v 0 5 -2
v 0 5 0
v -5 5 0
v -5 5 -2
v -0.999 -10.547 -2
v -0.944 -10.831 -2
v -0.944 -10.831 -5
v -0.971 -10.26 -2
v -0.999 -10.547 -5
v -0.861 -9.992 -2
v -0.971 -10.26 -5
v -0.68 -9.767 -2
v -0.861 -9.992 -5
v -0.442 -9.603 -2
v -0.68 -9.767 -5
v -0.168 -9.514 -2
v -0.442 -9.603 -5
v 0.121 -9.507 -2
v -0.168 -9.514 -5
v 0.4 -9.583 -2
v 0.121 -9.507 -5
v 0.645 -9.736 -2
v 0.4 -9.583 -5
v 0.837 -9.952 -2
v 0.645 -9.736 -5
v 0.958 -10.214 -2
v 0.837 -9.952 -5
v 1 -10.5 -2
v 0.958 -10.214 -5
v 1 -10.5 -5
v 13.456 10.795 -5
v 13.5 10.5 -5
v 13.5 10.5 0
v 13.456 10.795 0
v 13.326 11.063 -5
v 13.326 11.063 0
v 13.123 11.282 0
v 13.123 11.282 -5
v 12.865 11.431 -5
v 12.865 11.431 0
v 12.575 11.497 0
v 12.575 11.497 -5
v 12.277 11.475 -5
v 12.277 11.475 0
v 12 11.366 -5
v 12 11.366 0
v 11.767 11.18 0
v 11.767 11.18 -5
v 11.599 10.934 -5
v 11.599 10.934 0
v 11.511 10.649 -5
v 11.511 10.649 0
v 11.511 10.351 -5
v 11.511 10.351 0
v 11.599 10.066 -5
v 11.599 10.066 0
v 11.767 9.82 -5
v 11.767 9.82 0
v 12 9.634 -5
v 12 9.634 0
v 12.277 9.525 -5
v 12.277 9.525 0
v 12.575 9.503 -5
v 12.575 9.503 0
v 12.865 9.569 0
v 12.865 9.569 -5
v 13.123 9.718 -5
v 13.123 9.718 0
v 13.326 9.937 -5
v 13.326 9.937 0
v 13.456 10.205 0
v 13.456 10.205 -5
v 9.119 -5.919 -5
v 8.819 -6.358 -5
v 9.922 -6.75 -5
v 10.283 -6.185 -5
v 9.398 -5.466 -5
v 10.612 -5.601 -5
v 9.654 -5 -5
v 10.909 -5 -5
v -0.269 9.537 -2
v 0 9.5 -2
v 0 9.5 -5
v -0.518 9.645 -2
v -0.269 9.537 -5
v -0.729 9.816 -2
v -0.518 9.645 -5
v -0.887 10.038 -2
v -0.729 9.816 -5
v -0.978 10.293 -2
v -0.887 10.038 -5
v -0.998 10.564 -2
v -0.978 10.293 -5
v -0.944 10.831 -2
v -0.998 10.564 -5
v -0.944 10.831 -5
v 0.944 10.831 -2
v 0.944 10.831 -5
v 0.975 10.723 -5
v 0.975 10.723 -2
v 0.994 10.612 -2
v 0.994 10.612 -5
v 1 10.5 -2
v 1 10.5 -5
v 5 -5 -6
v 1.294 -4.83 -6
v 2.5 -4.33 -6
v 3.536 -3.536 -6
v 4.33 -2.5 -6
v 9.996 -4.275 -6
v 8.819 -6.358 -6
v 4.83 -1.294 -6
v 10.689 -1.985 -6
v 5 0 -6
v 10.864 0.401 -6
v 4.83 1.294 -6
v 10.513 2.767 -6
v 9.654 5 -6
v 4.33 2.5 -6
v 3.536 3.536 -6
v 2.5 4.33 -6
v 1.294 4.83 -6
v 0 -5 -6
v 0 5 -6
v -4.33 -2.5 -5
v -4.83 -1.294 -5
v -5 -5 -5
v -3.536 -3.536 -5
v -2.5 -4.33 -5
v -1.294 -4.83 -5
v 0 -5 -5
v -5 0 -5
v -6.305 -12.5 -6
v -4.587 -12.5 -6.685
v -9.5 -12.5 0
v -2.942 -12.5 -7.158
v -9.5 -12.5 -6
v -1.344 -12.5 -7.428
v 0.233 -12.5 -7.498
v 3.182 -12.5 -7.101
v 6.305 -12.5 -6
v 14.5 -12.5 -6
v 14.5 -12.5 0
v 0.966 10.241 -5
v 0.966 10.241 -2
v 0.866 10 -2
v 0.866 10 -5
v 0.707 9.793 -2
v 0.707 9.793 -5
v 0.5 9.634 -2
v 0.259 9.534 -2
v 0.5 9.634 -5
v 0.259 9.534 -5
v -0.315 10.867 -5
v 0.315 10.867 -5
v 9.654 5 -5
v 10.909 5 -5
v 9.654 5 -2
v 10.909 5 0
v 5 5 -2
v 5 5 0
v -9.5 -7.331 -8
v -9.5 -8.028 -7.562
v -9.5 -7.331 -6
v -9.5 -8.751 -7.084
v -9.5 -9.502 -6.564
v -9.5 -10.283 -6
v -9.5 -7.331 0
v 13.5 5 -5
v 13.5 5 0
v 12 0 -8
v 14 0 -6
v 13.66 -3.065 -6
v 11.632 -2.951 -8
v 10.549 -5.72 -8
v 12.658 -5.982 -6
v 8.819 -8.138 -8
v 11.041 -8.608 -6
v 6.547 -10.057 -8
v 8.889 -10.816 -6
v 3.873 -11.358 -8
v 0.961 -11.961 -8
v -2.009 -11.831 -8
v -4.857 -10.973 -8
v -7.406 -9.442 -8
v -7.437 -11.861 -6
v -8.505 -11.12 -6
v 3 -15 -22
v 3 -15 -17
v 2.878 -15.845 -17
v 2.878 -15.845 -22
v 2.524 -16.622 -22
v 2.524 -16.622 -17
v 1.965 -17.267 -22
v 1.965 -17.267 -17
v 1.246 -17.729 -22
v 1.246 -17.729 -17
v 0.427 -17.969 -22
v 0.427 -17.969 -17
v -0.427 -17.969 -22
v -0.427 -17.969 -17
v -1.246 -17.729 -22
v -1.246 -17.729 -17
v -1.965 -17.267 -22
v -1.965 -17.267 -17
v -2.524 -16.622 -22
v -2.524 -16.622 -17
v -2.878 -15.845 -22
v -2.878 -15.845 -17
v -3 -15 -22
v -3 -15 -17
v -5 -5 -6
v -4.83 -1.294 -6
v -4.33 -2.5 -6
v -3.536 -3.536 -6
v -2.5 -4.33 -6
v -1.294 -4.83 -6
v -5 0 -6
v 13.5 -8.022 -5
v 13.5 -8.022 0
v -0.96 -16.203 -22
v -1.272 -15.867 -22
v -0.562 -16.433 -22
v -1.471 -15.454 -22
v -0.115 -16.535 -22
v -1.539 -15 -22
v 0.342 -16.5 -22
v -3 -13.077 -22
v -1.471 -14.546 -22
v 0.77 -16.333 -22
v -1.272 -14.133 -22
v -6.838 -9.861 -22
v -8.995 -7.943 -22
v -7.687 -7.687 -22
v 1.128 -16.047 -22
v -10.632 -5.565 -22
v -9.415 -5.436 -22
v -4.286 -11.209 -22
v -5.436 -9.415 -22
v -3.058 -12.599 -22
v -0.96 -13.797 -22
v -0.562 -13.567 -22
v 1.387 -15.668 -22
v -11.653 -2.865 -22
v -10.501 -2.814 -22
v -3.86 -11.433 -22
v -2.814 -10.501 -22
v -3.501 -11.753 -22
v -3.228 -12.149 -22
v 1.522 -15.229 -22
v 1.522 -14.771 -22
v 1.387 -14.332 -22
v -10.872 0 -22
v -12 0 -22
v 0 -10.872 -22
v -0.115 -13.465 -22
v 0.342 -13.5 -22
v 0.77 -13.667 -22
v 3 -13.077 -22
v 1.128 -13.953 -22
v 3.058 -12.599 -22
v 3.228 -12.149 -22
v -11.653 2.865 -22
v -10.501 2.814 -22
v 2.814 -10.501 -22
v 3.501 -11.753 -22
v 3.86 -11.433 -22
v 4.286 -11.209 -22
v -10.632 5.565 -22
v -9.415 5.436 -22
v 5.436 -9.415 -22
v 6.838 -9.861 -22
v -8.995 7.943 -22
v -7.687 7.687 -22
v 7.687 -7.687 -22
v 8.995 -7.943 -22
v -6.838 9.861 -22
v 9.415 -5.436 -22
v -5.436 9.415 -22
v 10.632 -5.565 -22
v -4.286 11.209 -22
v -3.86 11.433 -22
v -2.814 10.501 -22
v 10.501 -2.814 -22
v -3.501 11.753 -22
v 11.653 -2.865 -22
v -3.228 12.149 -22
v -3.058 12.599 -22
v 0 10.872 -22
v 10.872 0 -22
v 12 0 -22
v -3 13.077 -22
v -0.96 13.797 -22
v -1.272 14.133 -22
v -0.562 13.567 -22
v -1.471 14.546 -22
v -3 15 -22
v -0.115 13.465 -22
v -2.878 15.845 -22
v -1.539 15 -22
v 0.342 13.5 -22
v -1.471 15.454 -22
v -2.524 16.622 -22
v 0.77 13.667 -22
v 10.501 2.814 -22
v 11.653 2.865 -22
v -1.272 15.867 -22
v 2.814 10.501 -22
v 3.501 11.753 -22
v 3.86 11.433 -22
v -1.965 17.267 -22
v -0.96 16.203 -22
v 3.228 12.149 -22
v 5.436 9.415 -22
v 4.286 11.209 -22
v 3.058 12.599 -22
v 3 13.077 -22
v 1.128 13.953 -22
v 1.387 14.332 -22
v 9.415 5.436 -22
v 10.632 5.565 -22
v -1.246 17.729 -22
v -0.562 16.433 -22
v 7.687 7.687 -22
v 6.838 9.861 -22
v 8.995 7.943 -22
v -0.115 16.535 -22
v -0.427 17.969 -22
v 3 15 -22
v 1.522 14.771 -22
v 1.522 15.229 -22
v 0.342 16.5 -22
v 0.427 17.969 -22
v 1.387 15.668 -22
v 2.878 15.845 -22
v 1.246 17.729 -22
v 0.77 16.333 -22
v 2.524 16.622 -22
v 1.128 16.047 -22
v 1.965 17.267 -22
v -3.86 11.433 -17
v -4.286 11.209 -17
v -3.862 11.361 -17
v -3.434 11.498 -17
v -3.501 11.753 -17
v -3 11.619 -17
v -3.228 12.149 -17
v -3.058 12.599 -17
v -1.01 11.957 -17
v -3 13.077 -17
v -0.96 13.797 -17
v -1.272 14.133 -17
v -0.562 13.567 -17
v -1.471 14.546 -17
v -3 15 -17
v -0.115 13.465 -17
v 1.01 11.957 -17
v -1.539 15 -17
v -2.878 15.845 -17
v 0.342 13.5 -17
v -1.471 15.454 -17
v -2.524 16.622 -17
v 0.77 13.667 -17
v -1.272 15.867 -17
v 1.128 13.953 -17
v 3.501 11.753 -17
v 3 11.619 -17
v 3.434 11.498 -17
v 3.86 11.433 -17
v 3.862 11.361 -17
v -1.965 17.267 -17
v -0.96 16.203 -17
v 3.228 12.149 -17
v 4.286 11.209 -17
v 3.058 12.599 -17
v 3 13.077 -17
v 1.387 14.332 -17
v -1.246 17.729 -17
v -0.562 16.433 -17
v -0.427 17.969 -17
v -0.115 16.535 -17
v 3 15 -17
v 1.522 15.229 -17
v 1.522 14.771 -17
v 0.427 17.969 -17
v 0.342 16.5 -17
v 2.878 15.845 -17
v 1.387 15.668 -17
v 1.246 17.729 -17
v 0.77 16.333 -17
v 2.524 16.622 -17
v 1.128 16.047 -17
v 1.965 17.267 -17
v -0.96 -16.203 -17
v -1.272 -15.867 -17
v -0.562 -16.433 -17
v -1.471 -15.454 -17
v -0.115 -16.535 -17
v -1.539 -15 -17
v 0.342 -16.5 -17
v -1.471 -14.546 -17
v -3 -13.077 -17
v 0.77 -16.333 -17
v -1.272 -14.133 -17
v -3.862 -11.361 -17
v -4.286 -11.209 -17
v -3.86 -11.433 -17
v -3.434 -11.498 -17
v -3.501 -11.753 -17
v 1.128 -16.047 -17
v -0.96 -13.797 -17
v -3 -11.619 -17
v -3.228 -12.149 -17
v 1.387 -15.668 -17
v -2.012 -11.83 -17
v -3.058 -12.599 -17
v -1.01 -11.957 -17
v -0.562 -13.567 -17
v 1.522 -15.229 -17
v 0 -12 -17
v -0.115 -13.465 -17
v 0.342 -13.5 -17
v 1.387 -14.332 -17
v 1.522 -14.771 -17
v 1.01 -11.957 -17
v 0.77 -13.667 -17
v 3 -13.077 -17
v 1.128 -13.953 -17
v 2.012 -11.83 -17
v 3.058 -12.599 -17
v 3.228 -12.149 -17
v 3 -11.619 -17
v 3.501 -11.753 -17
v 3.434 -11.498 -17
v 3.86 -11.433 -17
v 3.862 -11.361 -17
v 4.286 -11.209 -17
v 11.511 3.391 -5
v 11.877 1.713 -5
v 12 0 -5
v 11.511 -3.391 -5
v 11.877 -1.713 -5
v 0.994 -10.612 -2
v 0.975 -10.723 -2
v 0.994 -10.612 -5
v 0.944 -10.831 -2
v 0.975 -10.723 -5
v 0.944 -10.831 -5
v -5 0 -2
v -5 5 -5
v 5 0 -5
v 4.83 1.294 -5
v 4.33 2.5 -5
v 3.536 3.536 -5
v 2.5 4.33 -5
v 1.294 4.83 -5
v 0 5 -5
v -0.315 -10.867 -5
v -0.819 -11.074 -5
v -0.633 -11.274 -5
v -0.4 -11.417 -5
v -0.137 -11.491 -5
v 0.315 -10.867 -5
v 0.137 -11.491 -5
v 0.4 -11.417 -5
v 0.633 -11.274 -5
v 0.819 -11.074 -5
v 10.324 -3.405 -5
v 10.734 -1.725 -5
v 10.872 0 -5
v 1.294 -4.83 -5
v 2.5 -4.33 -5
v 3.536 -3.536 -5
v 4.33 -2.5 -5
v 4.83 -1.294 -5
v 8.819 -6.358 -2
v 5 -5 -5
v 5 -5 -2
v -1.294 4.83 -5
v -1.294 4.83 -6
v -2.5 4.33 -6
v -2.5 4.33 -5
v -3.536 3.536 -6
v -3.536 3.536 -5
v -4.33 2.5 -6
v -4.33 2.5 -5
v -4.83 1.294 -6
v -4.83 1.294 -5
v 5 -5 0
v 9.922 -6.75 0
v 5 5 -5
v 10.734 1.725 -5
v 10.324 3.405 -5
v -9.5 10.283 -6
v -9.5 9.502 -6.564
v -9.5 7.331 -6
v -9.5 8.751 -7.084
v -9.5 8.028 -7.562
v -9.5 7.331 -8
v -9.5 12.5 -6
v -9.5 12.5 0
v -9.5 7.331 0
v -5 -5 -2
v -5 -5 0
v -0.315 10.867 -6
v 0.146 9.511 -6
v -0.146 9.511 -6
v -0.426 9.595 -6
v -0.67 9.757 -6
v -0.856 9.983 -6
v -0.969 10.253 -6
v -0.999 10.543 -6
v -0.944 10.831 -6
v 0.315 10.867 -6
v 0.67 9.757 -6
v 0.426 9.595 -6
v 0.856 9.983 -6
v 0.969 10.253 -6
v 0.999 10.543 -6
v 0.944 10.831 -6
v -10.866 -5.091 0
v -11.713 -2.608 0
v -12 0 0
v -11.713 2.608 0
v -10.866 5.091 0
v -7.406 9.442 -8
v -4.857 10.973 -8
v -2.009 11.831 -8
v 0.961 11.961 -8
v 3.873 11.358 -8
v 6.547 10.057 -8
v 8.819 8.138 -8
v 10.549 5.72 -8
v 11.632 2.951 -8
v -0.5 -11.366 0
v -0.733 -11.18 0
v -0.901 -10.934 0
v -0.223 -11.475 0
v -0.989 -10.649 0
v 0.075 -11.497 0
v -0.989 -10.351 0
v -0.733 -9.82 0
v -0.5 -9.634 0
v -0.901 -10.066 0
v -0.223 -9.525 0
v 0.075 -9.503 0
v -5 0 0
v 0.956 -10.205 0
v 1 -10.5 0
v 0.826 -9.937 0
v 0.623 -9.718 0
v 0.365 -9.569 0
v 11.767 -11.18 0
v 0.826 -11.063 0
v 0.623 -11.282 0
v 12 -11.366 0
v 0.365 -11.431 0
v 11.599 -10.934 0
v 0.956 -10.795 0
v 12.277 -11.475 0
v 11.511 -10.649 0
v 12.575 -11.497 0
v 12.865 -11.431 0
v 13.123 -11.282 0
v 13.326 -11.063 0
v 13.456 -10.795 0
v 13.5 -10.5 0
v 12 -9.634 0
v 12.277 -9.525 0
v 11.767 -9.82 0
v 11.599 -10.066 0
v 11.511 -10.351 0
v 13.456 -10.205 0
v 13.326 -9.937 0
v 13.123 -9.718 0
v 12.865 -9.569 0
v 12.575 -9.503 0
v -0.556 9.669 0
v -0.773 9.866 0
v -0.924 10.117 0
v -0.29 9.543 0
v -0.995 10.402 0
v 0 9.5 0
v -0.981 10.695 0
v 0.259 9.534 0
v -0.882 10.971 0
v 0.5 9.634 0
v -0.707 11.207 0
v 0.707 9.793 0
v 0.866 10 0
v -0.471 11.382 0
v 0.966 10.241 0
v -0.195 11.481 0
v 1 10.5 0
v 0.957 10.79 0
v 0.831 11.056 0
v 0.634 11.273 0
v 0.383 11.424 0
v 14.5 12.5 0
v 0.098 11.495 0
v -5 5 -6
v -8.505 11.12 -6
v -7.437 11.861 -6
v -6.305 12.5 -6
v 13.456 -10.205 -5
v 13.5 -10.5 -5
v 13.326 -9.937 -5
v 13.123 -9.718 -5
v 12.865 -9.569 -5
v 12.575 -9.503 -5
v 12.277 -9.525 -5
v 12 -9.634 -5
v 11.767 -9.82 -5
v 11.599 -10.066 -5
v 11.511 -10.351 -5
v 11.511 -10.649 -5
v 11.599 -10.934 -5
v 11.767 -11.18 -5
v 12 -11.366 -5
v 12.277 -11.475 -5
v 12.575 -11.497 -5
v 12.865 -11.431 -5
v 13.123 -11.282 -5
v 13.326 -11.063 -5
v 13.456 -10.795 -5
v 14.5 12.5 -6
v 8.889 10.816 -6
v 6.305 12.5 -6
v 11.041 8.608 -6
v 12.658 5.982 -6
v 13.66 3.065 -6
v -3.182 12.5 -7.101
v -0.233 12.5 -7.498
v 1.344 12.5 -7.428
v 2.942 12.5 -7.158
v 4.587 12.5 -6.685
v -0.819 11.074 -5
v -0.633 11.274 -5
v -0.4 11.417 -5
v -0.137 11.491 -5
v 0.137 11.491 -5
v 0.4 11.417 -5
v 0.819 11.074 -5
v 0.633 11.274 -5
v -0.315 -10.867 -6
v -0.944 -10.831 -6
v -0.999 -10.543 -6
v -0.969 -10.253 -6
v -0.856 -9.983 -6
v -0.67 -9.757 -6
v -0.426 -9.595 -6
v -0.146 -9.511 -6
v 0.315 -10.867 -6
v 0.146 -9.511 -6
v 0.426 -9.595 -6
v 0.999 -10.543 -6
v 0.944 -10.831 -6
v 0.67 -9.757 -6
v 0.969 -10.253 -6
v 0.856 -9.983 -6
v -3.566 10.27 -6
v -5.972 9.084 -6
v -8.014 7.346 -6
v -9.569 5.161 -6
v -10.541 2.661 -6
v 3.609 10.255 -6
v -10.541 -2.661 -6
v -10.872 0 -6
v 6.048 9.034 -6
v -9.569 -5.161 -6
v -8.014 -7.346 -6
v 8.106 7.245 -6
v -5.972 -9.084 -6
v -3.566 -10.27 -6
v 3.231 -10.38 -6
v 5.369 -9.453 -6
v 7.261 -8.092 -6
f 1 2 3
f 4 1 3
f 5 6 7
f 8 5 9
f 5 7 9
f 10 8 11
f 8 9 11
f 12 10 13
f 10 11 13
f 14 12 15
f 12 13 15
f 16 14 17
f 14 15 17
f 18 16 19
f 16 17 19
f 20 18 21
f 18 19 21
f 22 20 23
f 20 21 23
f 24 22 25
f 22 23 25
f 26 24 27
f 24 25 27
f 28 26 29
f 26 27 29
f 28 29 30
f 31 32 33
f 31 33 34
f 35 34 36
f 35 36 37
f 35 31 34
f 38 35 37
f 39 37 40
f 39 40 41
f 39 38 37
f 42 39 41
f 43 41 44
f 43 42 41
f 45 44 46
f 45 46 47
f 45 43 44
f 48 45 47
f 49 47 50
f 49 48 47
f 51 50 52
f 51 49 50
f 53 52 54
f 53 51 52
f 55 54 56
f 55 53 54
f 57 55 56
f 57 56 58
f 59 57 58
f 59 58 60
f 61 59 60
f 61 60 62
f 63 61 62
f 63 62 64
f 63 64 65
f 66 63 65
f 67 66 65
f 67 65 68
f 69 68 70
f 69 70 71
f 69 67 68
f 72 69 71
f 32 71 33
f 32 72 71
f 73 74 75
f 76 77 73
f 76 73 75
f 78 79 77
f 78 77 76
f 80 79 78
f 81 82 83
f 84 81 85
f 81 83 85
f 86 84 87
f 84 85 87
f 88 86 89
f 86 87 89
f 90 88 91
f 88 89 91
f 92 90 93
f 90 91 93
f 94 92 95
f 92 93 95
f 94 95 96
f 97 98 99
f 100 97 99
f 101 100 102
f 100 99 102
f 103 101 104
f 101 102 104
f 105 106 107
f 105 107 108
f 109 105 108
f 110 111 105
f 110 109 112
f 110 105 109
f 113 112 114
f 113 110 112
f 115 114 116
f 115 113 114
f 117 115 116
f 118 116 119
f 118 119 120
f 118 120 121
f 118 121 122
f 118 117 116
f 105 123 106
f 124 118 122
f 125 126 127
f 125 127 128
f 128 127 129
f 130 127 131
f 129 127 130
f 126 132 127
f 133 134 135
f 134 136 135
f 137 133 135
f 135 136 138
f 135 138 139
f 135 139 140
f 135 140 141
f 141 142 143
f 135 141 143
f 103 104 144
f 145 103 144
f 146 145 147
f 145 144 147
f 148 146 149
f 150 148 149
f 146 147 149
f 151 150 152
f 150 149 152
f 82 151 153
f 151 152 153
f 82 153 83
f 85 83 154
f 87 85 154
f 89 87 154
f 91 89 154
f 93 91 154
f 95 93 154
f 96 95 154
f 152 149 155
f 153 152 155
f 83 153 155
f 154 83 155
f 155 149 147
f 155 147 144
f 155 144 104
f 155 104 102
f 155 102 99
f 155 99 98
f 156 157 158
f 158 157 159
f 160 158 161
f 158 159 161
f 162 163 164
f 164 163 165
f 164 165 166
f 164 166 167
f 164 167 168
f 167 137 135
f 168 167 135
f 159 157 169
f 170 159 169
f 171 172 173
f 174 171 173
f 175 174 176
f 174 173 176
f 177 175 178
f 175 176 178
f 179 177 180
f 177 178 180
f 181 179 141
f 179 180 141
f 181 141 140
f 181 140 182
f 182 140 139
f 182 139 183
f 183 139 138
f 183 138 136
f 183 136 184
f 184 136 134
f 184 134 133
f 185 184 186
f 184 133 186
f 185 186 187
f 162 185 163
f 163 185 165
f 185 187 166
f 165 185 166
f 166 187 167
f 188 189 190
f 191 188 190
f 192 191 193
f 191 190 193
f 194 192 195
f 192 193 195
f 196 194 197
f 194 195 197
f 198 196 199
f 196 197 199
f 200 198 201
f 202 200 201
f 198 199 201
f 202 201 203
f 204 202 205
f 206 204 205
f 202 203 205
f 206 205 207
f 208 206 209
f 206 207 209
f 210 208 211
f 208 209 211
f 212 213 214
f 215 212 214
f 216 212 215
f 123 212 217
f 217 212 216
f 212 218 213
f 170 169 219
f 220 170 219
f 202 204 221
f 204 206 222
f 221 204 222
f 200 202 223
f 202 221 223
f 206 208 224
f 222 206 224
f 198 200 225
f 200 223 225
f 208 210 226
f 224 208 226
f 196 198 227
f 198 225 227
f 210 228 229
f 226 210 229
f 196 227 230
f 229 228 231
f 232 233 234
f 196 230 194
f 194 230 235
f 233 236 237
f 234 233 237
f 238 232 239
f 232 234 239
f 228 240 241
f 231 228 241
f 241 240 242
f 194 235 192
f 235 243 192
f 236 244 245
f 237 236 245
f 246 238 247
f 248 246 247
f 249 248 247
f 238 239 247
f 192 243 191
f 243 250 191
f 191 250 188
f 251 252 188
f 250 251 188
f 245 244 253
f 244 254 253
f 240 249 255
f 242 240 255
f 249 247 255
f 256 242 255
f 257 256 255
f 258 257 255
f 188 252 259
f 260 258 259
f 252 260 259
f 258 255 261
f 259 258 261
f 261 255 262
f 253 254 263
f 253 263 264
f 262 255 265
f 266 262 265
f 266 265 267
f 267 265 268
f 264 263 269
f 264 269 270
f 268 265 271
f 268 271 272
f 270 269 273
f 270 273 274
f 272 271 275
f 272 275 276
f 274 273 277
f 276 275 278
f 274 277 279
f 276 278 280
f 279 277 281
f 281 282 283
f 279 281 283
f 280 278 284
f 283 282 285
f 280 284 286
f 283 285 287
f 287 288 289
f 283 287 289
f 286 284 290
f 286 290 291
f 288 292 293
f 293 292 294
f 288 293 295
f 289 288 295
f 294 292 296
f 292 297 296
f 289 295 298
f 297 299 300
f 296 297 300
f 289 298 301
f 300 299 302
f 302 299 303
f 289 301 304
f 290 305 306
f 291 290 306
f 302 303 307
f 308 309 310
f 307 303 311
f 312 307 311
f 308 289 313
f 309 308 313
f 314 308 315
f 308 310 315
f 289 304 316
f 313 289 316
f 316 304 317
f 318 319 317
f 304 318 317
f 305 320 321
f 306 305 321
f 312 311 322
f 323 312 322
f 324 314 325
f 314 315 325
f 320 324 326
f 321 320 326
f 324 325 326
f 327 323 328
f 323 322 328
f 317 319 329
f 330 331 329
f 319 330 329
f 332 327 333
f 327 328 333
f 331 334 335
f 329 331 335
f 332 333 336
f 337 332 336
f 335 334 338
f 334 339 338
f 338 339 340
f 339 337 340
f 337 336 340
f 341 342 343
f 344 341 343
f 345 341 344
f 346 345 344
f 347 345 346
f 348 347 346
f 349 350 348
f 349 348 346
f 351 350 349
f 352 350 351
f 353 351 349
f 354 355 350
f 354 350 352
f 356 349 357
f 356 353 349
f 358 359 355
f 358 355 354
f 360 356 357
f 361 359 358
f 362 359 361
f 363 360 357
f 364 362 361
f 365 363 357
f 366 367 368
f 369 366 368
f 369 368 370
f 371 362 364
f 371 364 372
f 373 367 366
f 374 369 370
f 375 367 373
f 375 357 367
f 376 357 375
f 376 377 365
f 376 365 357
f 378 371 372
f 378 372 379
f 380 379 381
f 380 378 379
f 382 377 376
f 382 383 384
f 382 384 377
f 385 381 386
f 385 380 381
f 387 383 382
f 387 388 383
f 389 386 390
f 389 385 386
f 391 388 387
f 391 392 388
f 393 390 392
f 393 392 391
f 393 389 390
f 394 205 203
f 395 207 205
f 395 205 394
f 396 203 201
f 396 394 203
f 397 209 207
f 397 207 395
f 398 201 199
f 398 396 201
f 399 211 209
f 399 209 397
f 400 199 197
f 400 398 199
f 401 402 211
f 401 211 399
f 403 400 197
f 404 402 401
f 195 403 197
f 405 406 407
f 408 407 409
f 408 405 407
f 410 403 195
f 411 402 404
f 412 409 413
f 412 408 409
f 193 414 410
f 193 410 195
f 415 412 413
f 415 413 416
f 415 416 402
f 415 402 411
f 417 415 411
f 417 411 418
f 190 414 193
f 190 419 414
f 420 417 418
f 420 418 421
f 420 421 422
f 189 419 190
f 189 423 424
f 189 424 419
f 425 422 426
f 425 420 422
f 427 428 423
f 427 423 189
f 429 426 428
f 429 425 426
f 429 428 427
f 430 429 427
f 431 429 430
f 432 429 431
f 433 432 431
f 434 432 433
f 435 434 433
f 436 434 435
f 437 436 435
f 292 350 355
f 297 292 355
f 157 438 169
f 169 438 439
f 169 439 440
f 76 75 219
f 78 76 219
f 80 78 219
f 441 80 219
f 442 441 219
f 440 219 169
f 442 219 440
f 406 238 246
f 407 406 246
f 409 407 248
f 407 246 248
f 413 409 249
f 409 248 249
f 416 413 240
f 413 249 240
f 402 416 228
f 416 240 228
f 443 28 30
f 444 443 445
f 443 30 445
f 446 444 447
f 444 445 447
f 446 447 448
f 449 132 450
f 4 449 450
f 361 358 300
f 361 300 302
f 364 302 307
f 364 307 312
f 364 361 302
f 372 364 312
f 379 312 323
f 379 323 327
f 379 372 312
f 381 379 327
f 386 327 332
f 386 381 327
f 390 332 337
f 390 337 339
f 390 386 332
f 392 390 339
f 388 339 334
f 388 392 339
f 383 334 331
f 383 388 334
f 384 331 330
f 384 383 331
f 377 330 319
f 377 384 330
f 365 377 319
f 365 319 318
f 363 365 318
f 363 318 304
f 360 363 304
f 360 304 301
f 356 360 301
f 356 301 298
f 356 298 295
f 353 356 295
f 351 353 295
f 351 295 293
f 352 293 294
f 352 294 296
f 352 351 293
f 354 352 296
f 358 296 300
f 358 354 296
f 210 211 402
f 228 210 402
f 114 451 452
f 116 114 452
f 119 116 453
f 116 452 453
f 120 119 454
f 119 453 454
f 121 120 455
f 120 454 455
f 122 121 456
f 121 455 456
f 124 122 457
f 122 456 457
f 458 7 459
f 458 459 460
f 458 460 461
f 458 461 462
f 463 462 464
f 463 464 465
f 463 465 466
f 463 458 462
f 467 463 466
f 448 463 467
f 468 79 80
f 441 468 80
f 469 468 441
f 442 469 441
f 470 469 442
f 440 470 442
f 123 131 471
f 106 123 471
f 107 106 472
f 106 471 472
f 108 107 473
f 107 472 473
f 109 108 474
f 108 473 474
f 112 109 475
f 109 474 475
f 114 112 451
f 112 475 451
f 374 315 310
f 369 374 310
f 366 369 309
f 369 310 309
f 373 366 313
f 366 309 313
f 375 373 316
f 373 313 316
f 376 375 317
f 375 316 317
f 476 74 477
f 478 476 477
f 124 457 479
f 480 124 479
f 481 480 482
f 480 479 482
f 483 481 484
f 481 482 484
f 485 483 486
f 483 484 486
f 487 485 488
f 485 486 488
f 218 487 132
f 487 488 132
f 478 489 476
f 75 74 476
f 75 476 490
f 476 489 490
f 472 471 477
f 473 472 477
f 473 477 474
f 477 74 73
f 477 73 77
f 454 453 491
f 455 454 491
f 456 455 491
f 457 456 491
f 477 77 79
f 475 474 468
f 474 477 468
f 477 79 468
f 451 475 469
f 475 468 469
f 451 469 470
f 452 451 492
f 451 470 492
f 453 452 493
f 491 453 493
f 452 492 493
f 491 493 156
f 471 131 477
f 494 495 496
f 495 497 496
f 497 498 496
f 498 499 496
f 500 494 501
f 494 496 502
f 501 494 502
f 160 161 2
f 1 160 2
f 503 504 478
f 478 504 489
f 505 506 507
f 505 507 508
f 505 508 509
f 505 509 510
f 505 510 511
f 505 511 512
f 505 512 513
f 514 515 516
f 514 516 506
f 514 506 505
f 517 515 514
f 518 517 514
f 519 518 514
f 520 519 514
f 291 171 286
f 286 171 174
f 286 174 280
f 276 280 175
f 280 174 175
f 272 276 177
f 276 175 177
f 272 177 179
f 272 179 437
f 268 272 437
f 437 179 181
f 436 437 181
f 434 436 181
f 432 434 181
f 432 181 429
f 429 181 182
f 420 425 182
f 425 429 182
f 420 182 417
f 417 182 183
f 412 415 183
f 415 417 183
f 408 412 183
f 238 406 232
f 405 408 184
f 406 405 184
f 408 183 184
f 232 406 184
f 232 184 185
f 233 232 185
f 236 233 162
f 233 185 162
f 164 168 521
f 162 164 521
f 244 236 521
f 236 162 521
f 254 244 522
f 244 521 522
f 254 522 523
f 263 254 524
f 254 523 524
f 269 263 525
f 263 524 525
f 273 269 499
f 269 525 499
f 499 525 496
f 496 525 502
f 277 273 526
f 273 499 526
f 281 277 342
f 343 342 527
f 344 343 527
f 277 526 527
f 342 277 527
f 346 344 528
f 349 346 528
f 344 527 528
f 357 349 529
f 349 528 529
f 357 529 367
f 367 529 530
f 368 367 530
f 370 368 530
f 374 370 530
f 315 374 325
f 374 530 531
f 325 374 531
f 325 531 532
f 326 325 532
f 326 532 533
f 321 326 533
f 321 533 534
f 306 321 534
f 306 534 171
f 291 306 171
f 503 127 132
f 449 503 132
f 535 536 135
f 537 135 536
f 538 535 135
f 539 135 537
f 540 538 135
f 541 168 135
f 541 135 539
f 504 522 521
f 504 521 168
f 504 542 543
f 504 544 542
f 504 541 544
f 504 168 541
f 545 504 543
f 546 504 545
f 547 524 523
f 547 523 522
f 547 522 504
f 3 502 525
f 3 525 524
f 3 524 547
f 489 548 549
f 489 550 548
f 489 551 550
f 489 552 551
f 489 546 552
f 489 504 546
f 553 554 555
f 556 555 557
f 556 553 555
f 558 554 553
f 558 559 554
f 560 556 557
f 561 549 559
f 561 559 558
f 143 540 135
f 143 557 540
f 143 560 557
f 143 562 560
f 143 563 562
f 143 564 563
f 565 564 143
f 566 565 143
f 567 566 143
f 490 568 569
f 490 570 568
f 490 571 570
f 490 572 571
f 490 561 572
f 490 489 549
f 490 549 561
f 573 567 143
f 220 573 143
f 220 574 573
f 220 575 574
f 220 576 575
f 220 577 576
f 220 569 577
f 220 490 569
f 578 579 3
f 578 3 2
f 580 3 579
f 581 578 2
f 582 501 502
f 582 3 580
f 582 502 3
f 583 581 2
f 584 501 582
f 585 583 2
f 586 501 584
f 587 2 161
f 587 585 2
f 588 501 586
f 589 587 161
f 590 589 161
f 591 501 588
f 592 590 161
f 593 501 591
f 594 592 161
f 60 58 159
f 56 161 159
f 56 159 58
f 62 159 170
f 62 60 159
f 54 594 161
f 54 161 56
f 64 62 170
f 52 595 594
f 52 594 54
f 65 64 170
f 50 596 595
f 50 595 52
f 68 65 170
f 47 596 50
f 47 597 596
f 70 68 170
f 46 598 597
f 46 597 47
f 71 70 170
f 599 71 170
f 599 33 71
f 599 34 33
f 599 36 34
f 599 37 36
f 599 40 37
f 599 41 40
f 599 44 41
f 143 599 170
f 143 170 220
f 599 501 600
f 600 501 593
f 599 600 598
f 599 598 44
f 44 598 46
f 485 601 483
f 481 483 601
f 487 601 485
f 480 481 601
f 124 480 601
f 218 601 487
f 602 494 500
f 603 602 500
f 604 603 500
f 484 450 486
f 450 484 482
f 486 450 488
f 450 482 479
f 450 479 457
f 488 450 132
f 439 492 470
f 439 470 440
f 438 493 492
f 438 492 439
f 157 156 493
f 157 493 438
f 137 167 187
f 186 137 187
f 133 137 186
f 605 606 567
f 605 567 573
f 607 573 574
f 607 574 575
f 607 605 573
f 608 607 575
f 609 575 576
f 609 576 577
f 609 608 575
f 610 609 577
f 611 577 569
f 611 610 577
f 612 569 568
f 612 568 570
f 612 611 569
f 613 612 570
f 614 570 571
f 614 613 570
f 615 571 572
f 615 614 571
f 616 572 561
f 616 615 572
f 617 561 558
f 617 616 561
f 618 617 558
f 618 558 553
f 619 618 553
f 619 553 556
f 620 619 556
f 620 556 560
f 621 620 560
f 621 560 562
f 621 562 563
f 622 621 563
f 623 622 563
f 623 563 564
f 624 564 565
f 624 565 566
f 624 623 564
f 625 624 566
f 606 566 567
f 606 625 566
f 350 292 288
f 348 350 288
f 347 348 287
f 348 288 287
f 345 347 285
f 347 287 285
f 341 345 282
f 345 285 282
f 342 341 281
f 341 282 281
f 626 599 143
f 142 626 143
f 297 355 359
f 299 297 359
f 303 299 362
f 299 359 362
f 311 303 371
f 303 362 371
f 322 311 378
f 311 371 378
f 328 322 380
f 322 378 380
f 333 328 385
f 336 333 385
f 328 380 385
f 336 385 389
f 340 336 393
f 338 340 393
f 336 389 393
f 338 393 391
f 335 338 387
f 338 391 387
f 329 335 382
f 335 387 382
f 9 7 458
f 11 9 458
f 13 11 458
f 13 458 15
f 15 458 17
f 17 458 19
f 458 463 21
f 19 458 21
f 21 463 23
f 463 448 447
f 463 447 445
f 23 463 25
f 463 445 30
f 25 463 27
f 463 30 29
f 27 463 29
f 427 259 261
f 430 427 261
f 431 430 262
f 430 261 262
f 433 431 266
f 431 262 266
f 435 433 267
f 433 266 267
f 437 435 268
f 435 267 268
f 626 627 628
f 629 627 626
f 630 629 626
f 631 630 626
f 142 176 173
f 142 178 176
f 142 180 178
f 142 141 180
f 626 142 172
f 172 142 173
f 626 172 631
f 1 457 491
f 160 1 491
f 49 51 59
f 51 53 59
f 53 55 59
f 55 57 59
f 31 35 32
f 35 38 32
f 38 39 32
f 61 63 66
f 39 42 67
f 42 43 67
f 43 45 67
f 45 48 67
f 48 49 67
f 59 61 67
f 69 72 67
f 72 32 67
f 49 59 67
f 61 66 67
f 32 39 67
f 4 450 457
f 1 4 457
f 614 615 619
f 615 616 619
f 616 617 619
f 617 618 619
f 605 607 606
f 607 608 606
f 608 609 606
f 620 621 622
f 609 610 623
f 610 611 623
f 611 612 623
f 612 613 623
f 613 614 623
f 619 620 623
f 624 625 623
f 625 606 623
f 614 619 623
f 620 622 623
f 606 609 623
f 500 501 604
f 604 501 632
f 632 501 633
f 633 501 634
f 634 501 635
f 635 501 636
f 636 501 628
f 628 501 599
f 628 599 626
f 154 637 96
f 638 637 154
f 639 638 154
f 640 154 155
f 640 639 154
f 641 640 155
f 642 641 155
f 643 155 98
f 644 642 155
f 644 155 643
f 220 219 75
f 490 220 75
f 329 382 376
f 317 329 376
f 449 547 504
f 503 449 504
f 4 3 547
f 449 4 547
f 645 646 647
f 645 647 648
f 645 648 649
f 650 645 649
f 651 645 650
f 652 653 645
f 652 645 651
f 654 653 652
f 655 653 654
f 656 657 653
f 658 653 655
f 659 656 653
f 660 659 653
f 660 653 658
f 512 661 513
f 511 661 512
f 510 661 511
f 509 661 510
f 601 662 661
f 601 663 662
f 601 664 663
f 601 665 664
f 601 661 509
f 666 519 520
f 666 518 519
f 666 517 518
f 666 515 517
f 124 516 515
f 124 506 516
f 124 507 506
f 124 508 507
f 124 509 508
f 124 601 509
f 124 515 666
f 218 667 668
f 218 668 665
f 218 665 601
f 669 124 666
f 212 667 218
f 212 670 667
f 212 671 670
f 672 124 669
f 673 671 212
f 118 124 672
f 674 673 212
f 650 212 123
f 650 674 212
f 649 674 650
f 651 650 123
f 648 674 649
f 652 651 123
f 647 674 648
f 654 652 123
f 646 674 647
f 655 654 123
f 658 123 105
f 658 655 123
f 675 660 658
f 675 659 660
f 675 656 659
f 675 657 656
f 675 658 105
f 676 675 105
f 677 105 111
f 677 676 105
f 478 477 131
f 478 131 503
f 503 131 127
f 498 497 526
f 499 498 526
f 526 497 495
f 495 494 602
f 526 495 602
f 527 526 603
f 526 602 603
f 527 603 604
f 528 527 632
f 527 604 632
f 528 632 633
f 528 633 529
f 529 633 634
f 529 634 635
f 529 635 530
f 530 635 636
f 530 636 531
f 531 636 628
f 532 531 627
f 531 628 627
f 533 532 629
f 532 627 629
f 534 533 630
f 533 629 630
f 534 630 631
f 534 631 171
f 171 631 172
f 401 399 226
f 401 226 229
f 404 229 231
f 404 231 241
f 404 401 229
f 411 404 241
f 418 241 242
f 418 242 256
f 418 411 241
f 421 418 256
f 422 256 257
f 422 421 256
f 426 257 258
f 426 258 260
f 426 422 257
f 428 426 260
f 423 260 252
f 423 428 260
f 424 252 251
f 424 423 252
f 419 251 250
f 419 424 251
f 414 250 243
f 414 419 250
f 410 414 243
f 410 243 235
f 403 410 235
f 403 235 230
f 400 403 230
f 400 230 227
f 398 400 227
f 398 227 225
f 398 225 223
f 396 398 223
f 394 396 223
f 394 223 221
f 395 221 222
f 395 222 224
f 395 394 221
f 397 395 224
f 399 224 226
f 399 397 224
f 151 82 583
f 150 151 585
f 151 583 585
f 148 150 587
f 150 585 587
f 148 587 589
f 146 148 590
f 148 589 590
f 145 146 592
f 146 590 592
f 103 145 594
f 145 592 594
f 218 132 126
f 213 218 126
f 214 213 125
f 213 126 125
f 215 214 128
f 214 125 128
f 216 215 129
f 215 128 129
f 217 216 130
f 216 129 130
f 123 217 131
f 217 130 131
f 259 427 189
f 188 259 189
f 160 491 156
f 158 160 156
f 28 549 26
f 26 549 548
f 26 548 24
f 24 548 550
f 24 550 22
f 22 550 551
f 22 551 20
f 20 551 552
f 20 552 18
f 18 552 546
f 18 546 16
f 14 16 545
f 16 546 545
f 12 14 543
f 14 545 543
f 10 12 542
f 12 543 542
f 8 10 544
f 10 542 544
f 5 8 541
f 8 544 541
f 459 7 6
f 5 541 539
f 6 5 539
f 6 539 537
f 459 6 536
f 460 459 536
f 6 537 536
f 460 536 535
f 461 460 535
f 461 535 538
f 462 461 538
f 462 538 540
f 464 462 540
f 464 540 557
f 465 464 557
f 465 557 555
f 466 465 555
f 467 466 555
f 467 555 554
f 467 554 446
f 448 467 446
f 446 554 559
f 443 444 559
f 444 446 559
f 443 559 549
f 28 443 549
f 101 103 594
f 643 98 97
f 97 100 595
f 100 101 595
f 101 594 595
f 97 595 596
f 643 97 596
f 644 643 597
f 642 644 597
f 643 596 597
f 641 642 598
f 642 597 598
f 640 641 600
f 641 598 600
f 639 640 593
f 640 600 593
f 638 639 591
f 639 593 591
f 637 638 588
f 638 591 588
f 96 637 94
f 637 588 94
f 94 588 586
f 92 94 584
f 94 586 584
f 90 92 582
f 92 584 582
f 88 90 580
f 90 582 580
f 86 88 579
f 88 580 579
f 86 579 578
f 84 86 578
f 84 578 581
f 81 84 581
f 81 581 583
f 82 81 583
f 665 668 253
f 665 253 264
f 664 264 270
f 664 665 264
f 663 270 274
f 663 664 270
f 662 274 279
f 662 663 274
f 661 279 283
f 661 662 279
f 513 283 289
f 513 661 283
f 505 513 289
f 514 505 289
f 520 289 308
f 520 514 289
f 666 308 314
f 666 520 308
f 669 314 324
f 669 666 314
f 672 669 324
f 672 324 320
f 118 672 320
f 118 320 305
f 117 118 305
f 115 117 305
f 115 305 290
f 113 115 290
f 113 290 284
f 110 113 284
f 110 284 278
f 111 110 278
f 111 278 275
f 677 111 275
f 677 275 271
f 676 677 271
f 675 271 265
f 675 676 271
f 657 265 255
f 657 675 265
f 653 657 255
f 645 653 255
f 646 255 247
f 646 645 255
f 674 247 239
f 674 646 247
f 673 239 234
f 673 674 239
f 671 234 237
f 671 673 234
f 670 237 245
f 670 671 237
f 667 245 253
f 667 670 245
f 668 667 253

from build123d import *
from build123d.topology import SkipClean

# Parameters (mm, degrees)
SKETCH1_R               = 12
SKETCH1_R_2             = 4.75
BOSS_EXTRUDE1_DEPTH     = 2
SKETCH2_R               = 12
SKETCH2_R_2             = 10.871602624
BOSS_EXTRUDE3_DEPTH     = 20
BOSS_EXTRUDE4_START     = -5
SKETCH3_R               = 1.539073807
BOSS_EXTRUDE4_DEPTH     = 5
BOSS_EXTRUDE4_2_DEPTH   = 5
BOSS_EXTRUDE5_START     = -5
BOSS_EXTRUDE5_OUTLINE_R = 1
BOSS_EXTRUDE5_DEPTH     = 5
SKETCH5_4_R             = 1
CUT_EXTRUDE4_DEPTH      = 5
SKETCH6_R               = 1
BOSS_EXTRUDE11_DEPTH    = 1
CHAMFER1_SIZE           = 2
FILLET2_START           = -22
FILLET2_DEPTH           = 5
SKETCH7_R               = 12
BOSS_EXTRUDE13_DEPTH    = 1


with BuildPart() as part:
    # Sketch1 → Boss-Extrude1 (new body)
    with BuildSketch(Plane(origin=(0, 0, 0), x_dir=(0, 1, 0), z_dir=(0, 0, 1))):
        with Locations(Location((0, 0, 0), (0, 0, 270))):
            Circle(SKETCH1_R)
        with Locations(Location((0, 0, 0), (0, 0, 270))):
            Circle(SKETCH1_R_2, mode=Mode.SUBTRACT)
    extrude(amount=-BOSS_EXTRUDE1_DEPTH)

    # Sketch2 → Boss-Extrude3 (add)
    with BuildSketch(Plane(origin=(0, 0, -2), x_dir=(1, 0, 0), z_dir=(0, 0, -1))):
        Circle(SKETCH2_R)
        with Locations(Location((0, 0, 0), (0, 0, 180))):
            Circle(SKETCH2_R_2, mode=Mode.SUBTRACT)
    extrude(amount=BOSS_EXTRUDE3_DEPTH)

    # Boss-Extrude5: read off the stored shape, not the designer's step
    # Boss-Extrude5 outline → Boss-Extrude5 (add)
    # profile 1 of 2: a face of its own
    with BuildSketch(Plane.XY.offset(BOSS_EXTRUDE5_START)):
        with BuildLine():
            ThreePointArc((0.943785252, -10.83055922), (5.369140506, -9.453257314), (8.818682626, -6.357875459))
            Line((8.818682626, -6.357875459), (5, -5))
            Line((5, -5), (-5, -5))
            Line((-5, -5), (-5, 5))
            Line((-5, 5), (9.653587085, 5))
            ThreePointArc((9.653587085, 5), (6.047721085, 9.034202416), (0.943785252, 10.83055922))
            ThreePointArc((0.943785252, 10.83055922), (0, 9.5), (-0.943785252, 10.83055922))
            ThreePointArc((-0.943785252, 10.83055922), (-10.871602624, 0), (-0.943785252, -10.83055922))
            ThreePointArc((-0.943785252, -10.83055922), (0, -9.5), (0.943785252, -10.83055922))
        make_face()
    # profile 2 of 2: a face of its own
    with BuildSketch(Plane.XY.offset(BOSS_EXTRUDE5_START)):
        with BuildLine():
            Line((13.5, 5), (13.5, -8.022492971))
            Line((13.5, -8.022492971), (9.921541449, -6.750038169))
            ThreePointArc((9.921541449, -6.750038169), (0.359069733, -11.994626669), (-9.5, -7.331439149))
            Line((-9.5, -7.331439149), (-9.5, -12.5))
            Line((-9.5, -12.5), (14.5, -12.5))
            Line((14.5, -12.5), (14.5, 12.5))
            Line((14.5, 12.5), (-9.5, 12.5))
            Line((-9.5, 12.5), (-9.5, 7.331439149))
            ThreePointArc((-9.5, 7.331439149), (1.361991036, 11.922456979), (10.908712115, 5))
            Line((10.908712115, 5), (13.5, 5))
        make_face()
        with Locations((12.5, -10.5)):
            Circle(BOSS_EXTRUDE5_OUTLINE_R, mode=Mode.SUBTRACT)
        with Locations((12.5, 10.5)):
            Circle(BOSS_EXTRUDE5_OUTLINE_R, mode=Mode.SUBTRACT)
    extrude(amount=BOSS_EXTRUDE5_DEPTH)

    # Sketch5<4> → Cut-Extrude4 (cut)
    with SkipClean():  # the faces are left unmerged after this step: merging them gives an invalid solid
        with BuildSketch(Plane.XY):
            with BuildLine():
                ThreePointArc((-4.75, 0), (-3.358757211, 3.358757211), (0, 4.75))
                Line((0, 4.75), (0, 5))
                Line((0, 5), (-5, 5))
                Line((-5, 5), (-5, 0))
                Line((-5, 0), (-4.75, 0))
            make_face()
            with BuildLine():
                ThreePointArc((0, 4.75), (3.358757211, 3.358757211), (4.75, 0))
                Line((4.75, 0), (5, 0))
                Line((5, 0), (5, 5))
                Line((5, 5), (0, 5))
                Line((0, 5), (0, 4.75))
            make_face()
            with BuildLine():
                Line((5, 0), (4.75, 0))
                ThreePointArc((4.75, 0), (0, -4.75), (-4.75, 0))
                Line((-4.75, 0), (-5, 0))
                Line((-5, 0), (-5, -5))
                Line((-5, -5), (5, -5))
                Line((5, -5), (5, 0))
            make_face()
            with BuildLine():
                ThreePointArc((1, 10.5), (-0.707106781, 11.207106781), (0, 9.5))
                Line((0, 9.5), (0, 10.5))
                Line((0, 10.5), (1, 10.5))
            make_face()
            with BuildLine():
                Line((0, 10.5), (0, 9.5))
                ThreePointArc((0, 9.5), (0.707106781, 9.792893219), (1, 10.5))
                Line((1, 10.5), (0, 10.5))
            make_face()
            with Locations((0, -10.5)):
                Circle(SKETCH5_4_R)
            with BuildLine():
                Line((12, 0), (5, 0))
                Line((5, 0), (5, -5))
                Line((5, -5), (10.908712115, -5))
                ThreePointArc((10.908712115, -5), (11.724004123, -2.558852734), (12, 0))
            make_face()
            with BuildLine():
                Line((5, 5), (5, 0))
                Line((5, 0), (12, 0))
                ThreePointArc((12, 0), (11.724004123, 2.558852734), (10.908712115, 5))
                Line((10.908712115, 5), (5, 5))
            make_face()
            with BuildLine():
                Line((10.908712115, -5), (5, -5))
                Line((5, -5), (9.921541449, -6.750038169))
                ThreePointArc((9.921541449, -6.750038169), (10.451819185, -5.895716727), (10.908712115, -5))
            make_face()
        extrude(amount=-CUT_EXTRUDE4_DEPTH, mode=Mode.SUBTRACT)

    # Sketch6 → Boss-Extrude11 (add)
    # profile 1 of 4: a face of its own
    with SkipClean():  # the faces are left unmerged after this step: merging them gives an invalid solid
        with BuildSketch(Plane(origin=(0, 0, -5), x_dir=(1, 0, 0), z_dir=(0, 0, -1))):
            with BuildLine():
                Line((-9.5, 12.5), (-9.5, 7.331439149))
                ThreePointArc((-9.5, 7.331439149), (0.359069733, 11.994626669), (9.921541449, 6.750038169))
                Line((9.921541449, 6.750038169), (13.5, 8.022492971))
                Line((13.5, 8.022492971), (13.5, -5))
                Line((13.5, -5), (10.908712115, -5))
                ThreePointArc((10.908712115, -5), (1.361991036, -11.922456979), (-9.5, -7.331439149))
                Line((-9.5, -7.331439149), (-9.5, -12.5))
                Line((-9.5, -12.5), (14.5, -12.5))
                Line((14.5, -12.5), (14.5, 12.5))
                Line((14.5, 12.5), (-9.5, 12.5))
            make_face()
            with Locations((12.5, -10.5)):
                Circle(SKETCH6_R, mode=Mode.SUBTRACT)
            with Locations((12.5, 10.5)):
                Circle(SKETCH6_R, mode=Mode.SUBTRACT)
        # profile 2 of 4: a face of its own
        with BuildSketch(Plane(origin=(0, 0, -5), x_dir=(1, 0, 0), z_dir=(0, 0, -1))):
            with BuildLine():
                Line((13.5, 8.022492971), (9.921541449, 6.750038169))
                ThreePointArc((9.921541449, 6.750038169), (11.468620174, 3.531395094), (12, 0))
                ThreePointArc((12, 0), (11.724004123, -2.558852734), (10.908712115, -5))
                Line((10.908712115, -5), (13.5, -5))
                Line((13.5, -5), (13.5, 8.022492971))
            make_face()
        # profile 3 of 4: a face of its own
        with BuildSketch(Plane(origin=(0, 0, -5), x_dir=(1, 0, 0), z_dir=(0, 0, -1))):
            with Locations((12.5, 10.5)):
                Circle(SKETCH6_R)
        # profile 4 of 4: a face of its own
        with BuildSketch(Plane(origin=(0, 0, -5), x_dir=(1, 0, 0), z_dir=(0, 0, -1))):
            with Locations((12.5, -10.5)):
                Circle(SKETCH6_R)
        extrude(amount=BOSS_EXTRUDE11_DEPTH)

    # Chamfer1
    # the kernel refuses this chamfer: 2 mm, written as the material it adds along each edge
    with BuildSketch(Plane(origin=(0, 0, -6), x_dir=(1, 0, 0), z_dir=(0, 1, 0))) as chamfer1_piece_1_section:
        Polygon((12, CHAMFER1_SIZE), (12 + CHAMFER1_SIZE, 0), (12, 0), align=None)
    chamfer1_piece_1 = revolve(axis=Axis((0, 0, -6), (0, 0, -1)), revolution_arc=166.923988161, mode=Mode.PRIVATE)
    chamfer1_piece_1 = split(chamfer1_piece_1, bisect_by=Plane(origin=(-9.5, 0, -6), z_dir=(1, 0, 0)), keep=Keep.TOP, mode=Mode.PRIVATE)
    chamfer1_piece_1 = split(chamfer1_piece_1, bisect_by=Plane(origin=(0, -12.5, -6), z_dir=(0, 1, 0)), keep=Keep.TOP, mode=Mode.PRIVATE)
    add(chamfer1_piece_1)
    with BuildSketch(Plane(origin=(0, 0, -6), x_dir=(-0.9740707745580937, 0.22624351073963517, 0), z_dir=(-0.22624351073963517, -0.9740707745580937, 0))) as chamfer1_piece_2_section:
        Polygon((12, CHAMFER1_SIZE), (12 + CHAMFER1_SIZE, 0), (12, 0), align=None)
    chamfer1_piece_2 = revolve(axis=Axis((0, 0, -6), (0, 0, -1)), revolution_arc=166.923988161, mode=Mode.PRIVATE)
    chamfer1_piece_2 = split(chamfer1_piece_2, bisect_by=Plane(origin=(-9.5, 0, -6), z_dir=(1, 0, 0)), keep=Keep.TOP, mode=Mode.PRIVATE)
    chamfer1_piece_2 = split(chamfer1_piece_2, bisect_by=Plane(origin=(0, 12.5, -6), z_dir=(0, -1, 0)), keep=Keep.TOP, mode=Mode.PRIVATE)
    add(chamfer1_piece_2)


with BuildPart() as body_2:
    # Sketch3 → Boss-Extrude4 (new body)
    with BuildSketch(Plane(origin=(0, 0, -22), x_dir=(1, 0, 0), z_dir=(0, 0, -1)).offset(BOSS_EXTRUDE4_START)):
        with BuildLine():
            Line((3, 11.618950039), (3, 15))
            ThreePointArc((3, 15), (0, 18), (-3, 15))
            Line((-3, 15), (-3, 11.618950039))
            ThreePointArc((-3, 11.618950039), (-1.512051513, 11.904356355), (-6e-09, 12))
            ThreePointArc((-6e-09, 12), (1.512051507, 11.904356356), (3, 11.618950039))
        make_face()
        with Locations(Location((0, 15, 0), (0, 0, 180))):
            Circle(SKETCH3_R, mode=Mode.SUBTRACT)
    extrude(amount=BOSS_EXTRUDE4_DEPTH)


with BuildPart() as body_3:
    # Sketch3 → Boss-Extrude4 2 (new body)
    with BuildSketch(Plane(origin=(0, 0, -22), x_dir=(1, 0, 0), z_dir=(0, 0, -1)).offset(BOSS_EXTRUDE4_START)):
        with BuildLine():
            Line((-3, -11.618950039), (-3, -15))
            ThreePointArc((-3, -15), (0, -18), (3, -15))
            Line((3, -15), (3, -11.618950039))
            ThreePointArc((3, -11.618950039), (0, -12), (-3, -11.618950039))
        make_face()
        with Locations(Location((0, -15, 0), (0, 0, 180))):
            Circle(SKETCH3_R, mode=Mode.SUBTRACT)
    extrude(amount=BOSS_EXTRUDE4_2_DEPTH)


with BuildPart() as body_2_1:
    add(body_2.part)

    # Combine1: union body 3, part
    add(body_3.part)
    add(part.part)

    # Fillet2: read off the stored shape, not the designer's step
    # Fillet2 outline → Fillet2 (add)
    with SkipClean():  # the faces are left unmerged after this step: merging them gives an invalid solid
        with BuildSketch(Plane.XY.offset(FILLET2_START)):
            with BuildLine():
                ThreePointArc((4.285714286, 11.208597283), (3.352491058, 11.942803412), (3, 13.076696831))
                Line((3, 13.076696831), (3, 11.618950039))
                ThreePointArc((3, 11.618950039), (3.648630635, 11.431863124), (4.285714286, 11.208597283))
            make_face()
            with BuildLine():
                ThreePointArc((-4.285714286, 11.208597283), (-3.648630635, 11.431863124), (-3, 11.618950039))
                Line((-3, 11.618950039), (-3, 13.076696831))
                ThreePointArc((-3, 13.076696831), (-3.352491058, 11.942803412), (-4.285714286, 11.208597283))
            make_face()
            with BuildLine():
                ThreePointArc((3, -13.076696831), (3.352491058, -11.942803412), (4.285714286, -11.208597283))
                ThreePointArc((4.285714286, -11.208597283), (3.648630635, -11.431863124), (3, -11.618950039))
                Line((3, -11.618950039), (3, -13.076696831))
            make_face()
            with BuildLine():
                ThreePointArc((-3, -11.618950039), (-3.648630635, -11.431863124), (-4.285714286, -11.208597283))
                ThreePointArc((-4.285714286, -11.208597283), (-3.352491058, -11.942803412), (-3, -13.076696831))
                Line((-3, -13.076696831), (-3, -11.618950039))
            make_face()
        extrude(amount=FILLET2_DEPTH)
    add(body_2_1.part.scale(1), mode=Mode.REPLACE)  # the faces are merged on a copy

    # Sketch7 → Boss-Extrude13 (add)
    # profile 1 of 4: a face of its own
    with BuildSketch(Plane(origin=(0, 0, -5), x_dir=(1, 0, 0), z_dir=(0, 0, -1))):
        with Locations(Location((0, 0, 0), (0, 0, 290.924832428))):
            Circle(SKETCH7_R)
        with BuildLine():
            ThreePointArc((0, 5), (3.535533906, 3.535533906), (5, 0))
            ThreePointArc((5, 0), (3.535533906, -3.535533906), (0, -5))
            Line((0, -5), (9.653587086, -5))
            ThreePointArc((9.653587086, -5), (6.047721085, -9.034202416), (0.943785252, -10.83055922))
            ThreePointArc((0.943785252, -10.83055922), (0, -9.5), (-0.943785252, -10.83055922))
            ThreePointArc((-0.943785252, -10.83055922), (-10.871602624, 0), (-0.943785252, 10.83055922))
            ThreePointArc((-0.943785252, 10.83055922), (0, 9.5), (0.943785252, 10.83055922))
            ThreePointArc((0.943785252, 10.83055922), (5.369140507, 9.453257314), (8.818682627, 6.357875459))
            Line((8.818682627, 6.357875459), (5, 5))
            Line((5, 5), (0, 5))
        make_face(mode=Mode.SUBTRACT)
    # profile 2 of 4: a face of its own
    with BuildSketch(Plane(origin=(0, 0, -5), x_dir=(1, 0, 0), z_dir=(0, 0, -1))):
        with BuildLine():
            ThreePointArc((-0.943785252, -10.83055922), (0, -9.5), (0.943785252, -10.83055922))
            ThreePointArc((0.943785252, -10.83055922), (6.047721085, -9.034202416), (9.653587086, -5))
            Line((9.653587086, -5), (-5, -5))
            Line((-5, -5), (-5, 5))
            Line((-5, 5), (5, 5))
            Line((5, 5), (8.818682627, 6.357875459))
            ThreePointArc((8.818682627, 6.357875459), (5.369140507, 9.453257314), (0.943785252, 10.83055922))
            ThreePointArc((0.943785252, 10.83055922), (0, 9.5), (-0.943785252, 10.83055922))
            ThreePointArc((-0.943785252, 10.83055922), (-10.871602624, 0), (-0.943785252, -10.83055922))
        make_face()
    # profile 3 of 4: a face of its own
    with BuildSketch(Plane(origin=(0, 0, -5), x_dir=(1, 0, 0), z_dir=(0, 0, -1))):
        with BuildLine():
            ThreePointArc((-5, 0), (-3.535533906, 3.535533906), (0, 5))
            Line((0, 5), (-5, 5))
            Line((-5, 5), (-5, 0))
        make_face()
    # profile 4 of 4: a face of its own
    with BuildSketch(Plane(origin=(0, 0, -5), x_dir=(1, 0, 0), z_dir=(0, 0, -1))):
        with BuildLine():
            Line((-5, -5), (0, -5))
            ThreePointArc((0, -5), (-3.535533906, -3.535533906), (-5, 0))
            Line((-5, 0), (-5, -5))
        make_face()
    extrude(amount=BOSS_EXTRUDE13_DEPTH)


solid = body_2_1.part
